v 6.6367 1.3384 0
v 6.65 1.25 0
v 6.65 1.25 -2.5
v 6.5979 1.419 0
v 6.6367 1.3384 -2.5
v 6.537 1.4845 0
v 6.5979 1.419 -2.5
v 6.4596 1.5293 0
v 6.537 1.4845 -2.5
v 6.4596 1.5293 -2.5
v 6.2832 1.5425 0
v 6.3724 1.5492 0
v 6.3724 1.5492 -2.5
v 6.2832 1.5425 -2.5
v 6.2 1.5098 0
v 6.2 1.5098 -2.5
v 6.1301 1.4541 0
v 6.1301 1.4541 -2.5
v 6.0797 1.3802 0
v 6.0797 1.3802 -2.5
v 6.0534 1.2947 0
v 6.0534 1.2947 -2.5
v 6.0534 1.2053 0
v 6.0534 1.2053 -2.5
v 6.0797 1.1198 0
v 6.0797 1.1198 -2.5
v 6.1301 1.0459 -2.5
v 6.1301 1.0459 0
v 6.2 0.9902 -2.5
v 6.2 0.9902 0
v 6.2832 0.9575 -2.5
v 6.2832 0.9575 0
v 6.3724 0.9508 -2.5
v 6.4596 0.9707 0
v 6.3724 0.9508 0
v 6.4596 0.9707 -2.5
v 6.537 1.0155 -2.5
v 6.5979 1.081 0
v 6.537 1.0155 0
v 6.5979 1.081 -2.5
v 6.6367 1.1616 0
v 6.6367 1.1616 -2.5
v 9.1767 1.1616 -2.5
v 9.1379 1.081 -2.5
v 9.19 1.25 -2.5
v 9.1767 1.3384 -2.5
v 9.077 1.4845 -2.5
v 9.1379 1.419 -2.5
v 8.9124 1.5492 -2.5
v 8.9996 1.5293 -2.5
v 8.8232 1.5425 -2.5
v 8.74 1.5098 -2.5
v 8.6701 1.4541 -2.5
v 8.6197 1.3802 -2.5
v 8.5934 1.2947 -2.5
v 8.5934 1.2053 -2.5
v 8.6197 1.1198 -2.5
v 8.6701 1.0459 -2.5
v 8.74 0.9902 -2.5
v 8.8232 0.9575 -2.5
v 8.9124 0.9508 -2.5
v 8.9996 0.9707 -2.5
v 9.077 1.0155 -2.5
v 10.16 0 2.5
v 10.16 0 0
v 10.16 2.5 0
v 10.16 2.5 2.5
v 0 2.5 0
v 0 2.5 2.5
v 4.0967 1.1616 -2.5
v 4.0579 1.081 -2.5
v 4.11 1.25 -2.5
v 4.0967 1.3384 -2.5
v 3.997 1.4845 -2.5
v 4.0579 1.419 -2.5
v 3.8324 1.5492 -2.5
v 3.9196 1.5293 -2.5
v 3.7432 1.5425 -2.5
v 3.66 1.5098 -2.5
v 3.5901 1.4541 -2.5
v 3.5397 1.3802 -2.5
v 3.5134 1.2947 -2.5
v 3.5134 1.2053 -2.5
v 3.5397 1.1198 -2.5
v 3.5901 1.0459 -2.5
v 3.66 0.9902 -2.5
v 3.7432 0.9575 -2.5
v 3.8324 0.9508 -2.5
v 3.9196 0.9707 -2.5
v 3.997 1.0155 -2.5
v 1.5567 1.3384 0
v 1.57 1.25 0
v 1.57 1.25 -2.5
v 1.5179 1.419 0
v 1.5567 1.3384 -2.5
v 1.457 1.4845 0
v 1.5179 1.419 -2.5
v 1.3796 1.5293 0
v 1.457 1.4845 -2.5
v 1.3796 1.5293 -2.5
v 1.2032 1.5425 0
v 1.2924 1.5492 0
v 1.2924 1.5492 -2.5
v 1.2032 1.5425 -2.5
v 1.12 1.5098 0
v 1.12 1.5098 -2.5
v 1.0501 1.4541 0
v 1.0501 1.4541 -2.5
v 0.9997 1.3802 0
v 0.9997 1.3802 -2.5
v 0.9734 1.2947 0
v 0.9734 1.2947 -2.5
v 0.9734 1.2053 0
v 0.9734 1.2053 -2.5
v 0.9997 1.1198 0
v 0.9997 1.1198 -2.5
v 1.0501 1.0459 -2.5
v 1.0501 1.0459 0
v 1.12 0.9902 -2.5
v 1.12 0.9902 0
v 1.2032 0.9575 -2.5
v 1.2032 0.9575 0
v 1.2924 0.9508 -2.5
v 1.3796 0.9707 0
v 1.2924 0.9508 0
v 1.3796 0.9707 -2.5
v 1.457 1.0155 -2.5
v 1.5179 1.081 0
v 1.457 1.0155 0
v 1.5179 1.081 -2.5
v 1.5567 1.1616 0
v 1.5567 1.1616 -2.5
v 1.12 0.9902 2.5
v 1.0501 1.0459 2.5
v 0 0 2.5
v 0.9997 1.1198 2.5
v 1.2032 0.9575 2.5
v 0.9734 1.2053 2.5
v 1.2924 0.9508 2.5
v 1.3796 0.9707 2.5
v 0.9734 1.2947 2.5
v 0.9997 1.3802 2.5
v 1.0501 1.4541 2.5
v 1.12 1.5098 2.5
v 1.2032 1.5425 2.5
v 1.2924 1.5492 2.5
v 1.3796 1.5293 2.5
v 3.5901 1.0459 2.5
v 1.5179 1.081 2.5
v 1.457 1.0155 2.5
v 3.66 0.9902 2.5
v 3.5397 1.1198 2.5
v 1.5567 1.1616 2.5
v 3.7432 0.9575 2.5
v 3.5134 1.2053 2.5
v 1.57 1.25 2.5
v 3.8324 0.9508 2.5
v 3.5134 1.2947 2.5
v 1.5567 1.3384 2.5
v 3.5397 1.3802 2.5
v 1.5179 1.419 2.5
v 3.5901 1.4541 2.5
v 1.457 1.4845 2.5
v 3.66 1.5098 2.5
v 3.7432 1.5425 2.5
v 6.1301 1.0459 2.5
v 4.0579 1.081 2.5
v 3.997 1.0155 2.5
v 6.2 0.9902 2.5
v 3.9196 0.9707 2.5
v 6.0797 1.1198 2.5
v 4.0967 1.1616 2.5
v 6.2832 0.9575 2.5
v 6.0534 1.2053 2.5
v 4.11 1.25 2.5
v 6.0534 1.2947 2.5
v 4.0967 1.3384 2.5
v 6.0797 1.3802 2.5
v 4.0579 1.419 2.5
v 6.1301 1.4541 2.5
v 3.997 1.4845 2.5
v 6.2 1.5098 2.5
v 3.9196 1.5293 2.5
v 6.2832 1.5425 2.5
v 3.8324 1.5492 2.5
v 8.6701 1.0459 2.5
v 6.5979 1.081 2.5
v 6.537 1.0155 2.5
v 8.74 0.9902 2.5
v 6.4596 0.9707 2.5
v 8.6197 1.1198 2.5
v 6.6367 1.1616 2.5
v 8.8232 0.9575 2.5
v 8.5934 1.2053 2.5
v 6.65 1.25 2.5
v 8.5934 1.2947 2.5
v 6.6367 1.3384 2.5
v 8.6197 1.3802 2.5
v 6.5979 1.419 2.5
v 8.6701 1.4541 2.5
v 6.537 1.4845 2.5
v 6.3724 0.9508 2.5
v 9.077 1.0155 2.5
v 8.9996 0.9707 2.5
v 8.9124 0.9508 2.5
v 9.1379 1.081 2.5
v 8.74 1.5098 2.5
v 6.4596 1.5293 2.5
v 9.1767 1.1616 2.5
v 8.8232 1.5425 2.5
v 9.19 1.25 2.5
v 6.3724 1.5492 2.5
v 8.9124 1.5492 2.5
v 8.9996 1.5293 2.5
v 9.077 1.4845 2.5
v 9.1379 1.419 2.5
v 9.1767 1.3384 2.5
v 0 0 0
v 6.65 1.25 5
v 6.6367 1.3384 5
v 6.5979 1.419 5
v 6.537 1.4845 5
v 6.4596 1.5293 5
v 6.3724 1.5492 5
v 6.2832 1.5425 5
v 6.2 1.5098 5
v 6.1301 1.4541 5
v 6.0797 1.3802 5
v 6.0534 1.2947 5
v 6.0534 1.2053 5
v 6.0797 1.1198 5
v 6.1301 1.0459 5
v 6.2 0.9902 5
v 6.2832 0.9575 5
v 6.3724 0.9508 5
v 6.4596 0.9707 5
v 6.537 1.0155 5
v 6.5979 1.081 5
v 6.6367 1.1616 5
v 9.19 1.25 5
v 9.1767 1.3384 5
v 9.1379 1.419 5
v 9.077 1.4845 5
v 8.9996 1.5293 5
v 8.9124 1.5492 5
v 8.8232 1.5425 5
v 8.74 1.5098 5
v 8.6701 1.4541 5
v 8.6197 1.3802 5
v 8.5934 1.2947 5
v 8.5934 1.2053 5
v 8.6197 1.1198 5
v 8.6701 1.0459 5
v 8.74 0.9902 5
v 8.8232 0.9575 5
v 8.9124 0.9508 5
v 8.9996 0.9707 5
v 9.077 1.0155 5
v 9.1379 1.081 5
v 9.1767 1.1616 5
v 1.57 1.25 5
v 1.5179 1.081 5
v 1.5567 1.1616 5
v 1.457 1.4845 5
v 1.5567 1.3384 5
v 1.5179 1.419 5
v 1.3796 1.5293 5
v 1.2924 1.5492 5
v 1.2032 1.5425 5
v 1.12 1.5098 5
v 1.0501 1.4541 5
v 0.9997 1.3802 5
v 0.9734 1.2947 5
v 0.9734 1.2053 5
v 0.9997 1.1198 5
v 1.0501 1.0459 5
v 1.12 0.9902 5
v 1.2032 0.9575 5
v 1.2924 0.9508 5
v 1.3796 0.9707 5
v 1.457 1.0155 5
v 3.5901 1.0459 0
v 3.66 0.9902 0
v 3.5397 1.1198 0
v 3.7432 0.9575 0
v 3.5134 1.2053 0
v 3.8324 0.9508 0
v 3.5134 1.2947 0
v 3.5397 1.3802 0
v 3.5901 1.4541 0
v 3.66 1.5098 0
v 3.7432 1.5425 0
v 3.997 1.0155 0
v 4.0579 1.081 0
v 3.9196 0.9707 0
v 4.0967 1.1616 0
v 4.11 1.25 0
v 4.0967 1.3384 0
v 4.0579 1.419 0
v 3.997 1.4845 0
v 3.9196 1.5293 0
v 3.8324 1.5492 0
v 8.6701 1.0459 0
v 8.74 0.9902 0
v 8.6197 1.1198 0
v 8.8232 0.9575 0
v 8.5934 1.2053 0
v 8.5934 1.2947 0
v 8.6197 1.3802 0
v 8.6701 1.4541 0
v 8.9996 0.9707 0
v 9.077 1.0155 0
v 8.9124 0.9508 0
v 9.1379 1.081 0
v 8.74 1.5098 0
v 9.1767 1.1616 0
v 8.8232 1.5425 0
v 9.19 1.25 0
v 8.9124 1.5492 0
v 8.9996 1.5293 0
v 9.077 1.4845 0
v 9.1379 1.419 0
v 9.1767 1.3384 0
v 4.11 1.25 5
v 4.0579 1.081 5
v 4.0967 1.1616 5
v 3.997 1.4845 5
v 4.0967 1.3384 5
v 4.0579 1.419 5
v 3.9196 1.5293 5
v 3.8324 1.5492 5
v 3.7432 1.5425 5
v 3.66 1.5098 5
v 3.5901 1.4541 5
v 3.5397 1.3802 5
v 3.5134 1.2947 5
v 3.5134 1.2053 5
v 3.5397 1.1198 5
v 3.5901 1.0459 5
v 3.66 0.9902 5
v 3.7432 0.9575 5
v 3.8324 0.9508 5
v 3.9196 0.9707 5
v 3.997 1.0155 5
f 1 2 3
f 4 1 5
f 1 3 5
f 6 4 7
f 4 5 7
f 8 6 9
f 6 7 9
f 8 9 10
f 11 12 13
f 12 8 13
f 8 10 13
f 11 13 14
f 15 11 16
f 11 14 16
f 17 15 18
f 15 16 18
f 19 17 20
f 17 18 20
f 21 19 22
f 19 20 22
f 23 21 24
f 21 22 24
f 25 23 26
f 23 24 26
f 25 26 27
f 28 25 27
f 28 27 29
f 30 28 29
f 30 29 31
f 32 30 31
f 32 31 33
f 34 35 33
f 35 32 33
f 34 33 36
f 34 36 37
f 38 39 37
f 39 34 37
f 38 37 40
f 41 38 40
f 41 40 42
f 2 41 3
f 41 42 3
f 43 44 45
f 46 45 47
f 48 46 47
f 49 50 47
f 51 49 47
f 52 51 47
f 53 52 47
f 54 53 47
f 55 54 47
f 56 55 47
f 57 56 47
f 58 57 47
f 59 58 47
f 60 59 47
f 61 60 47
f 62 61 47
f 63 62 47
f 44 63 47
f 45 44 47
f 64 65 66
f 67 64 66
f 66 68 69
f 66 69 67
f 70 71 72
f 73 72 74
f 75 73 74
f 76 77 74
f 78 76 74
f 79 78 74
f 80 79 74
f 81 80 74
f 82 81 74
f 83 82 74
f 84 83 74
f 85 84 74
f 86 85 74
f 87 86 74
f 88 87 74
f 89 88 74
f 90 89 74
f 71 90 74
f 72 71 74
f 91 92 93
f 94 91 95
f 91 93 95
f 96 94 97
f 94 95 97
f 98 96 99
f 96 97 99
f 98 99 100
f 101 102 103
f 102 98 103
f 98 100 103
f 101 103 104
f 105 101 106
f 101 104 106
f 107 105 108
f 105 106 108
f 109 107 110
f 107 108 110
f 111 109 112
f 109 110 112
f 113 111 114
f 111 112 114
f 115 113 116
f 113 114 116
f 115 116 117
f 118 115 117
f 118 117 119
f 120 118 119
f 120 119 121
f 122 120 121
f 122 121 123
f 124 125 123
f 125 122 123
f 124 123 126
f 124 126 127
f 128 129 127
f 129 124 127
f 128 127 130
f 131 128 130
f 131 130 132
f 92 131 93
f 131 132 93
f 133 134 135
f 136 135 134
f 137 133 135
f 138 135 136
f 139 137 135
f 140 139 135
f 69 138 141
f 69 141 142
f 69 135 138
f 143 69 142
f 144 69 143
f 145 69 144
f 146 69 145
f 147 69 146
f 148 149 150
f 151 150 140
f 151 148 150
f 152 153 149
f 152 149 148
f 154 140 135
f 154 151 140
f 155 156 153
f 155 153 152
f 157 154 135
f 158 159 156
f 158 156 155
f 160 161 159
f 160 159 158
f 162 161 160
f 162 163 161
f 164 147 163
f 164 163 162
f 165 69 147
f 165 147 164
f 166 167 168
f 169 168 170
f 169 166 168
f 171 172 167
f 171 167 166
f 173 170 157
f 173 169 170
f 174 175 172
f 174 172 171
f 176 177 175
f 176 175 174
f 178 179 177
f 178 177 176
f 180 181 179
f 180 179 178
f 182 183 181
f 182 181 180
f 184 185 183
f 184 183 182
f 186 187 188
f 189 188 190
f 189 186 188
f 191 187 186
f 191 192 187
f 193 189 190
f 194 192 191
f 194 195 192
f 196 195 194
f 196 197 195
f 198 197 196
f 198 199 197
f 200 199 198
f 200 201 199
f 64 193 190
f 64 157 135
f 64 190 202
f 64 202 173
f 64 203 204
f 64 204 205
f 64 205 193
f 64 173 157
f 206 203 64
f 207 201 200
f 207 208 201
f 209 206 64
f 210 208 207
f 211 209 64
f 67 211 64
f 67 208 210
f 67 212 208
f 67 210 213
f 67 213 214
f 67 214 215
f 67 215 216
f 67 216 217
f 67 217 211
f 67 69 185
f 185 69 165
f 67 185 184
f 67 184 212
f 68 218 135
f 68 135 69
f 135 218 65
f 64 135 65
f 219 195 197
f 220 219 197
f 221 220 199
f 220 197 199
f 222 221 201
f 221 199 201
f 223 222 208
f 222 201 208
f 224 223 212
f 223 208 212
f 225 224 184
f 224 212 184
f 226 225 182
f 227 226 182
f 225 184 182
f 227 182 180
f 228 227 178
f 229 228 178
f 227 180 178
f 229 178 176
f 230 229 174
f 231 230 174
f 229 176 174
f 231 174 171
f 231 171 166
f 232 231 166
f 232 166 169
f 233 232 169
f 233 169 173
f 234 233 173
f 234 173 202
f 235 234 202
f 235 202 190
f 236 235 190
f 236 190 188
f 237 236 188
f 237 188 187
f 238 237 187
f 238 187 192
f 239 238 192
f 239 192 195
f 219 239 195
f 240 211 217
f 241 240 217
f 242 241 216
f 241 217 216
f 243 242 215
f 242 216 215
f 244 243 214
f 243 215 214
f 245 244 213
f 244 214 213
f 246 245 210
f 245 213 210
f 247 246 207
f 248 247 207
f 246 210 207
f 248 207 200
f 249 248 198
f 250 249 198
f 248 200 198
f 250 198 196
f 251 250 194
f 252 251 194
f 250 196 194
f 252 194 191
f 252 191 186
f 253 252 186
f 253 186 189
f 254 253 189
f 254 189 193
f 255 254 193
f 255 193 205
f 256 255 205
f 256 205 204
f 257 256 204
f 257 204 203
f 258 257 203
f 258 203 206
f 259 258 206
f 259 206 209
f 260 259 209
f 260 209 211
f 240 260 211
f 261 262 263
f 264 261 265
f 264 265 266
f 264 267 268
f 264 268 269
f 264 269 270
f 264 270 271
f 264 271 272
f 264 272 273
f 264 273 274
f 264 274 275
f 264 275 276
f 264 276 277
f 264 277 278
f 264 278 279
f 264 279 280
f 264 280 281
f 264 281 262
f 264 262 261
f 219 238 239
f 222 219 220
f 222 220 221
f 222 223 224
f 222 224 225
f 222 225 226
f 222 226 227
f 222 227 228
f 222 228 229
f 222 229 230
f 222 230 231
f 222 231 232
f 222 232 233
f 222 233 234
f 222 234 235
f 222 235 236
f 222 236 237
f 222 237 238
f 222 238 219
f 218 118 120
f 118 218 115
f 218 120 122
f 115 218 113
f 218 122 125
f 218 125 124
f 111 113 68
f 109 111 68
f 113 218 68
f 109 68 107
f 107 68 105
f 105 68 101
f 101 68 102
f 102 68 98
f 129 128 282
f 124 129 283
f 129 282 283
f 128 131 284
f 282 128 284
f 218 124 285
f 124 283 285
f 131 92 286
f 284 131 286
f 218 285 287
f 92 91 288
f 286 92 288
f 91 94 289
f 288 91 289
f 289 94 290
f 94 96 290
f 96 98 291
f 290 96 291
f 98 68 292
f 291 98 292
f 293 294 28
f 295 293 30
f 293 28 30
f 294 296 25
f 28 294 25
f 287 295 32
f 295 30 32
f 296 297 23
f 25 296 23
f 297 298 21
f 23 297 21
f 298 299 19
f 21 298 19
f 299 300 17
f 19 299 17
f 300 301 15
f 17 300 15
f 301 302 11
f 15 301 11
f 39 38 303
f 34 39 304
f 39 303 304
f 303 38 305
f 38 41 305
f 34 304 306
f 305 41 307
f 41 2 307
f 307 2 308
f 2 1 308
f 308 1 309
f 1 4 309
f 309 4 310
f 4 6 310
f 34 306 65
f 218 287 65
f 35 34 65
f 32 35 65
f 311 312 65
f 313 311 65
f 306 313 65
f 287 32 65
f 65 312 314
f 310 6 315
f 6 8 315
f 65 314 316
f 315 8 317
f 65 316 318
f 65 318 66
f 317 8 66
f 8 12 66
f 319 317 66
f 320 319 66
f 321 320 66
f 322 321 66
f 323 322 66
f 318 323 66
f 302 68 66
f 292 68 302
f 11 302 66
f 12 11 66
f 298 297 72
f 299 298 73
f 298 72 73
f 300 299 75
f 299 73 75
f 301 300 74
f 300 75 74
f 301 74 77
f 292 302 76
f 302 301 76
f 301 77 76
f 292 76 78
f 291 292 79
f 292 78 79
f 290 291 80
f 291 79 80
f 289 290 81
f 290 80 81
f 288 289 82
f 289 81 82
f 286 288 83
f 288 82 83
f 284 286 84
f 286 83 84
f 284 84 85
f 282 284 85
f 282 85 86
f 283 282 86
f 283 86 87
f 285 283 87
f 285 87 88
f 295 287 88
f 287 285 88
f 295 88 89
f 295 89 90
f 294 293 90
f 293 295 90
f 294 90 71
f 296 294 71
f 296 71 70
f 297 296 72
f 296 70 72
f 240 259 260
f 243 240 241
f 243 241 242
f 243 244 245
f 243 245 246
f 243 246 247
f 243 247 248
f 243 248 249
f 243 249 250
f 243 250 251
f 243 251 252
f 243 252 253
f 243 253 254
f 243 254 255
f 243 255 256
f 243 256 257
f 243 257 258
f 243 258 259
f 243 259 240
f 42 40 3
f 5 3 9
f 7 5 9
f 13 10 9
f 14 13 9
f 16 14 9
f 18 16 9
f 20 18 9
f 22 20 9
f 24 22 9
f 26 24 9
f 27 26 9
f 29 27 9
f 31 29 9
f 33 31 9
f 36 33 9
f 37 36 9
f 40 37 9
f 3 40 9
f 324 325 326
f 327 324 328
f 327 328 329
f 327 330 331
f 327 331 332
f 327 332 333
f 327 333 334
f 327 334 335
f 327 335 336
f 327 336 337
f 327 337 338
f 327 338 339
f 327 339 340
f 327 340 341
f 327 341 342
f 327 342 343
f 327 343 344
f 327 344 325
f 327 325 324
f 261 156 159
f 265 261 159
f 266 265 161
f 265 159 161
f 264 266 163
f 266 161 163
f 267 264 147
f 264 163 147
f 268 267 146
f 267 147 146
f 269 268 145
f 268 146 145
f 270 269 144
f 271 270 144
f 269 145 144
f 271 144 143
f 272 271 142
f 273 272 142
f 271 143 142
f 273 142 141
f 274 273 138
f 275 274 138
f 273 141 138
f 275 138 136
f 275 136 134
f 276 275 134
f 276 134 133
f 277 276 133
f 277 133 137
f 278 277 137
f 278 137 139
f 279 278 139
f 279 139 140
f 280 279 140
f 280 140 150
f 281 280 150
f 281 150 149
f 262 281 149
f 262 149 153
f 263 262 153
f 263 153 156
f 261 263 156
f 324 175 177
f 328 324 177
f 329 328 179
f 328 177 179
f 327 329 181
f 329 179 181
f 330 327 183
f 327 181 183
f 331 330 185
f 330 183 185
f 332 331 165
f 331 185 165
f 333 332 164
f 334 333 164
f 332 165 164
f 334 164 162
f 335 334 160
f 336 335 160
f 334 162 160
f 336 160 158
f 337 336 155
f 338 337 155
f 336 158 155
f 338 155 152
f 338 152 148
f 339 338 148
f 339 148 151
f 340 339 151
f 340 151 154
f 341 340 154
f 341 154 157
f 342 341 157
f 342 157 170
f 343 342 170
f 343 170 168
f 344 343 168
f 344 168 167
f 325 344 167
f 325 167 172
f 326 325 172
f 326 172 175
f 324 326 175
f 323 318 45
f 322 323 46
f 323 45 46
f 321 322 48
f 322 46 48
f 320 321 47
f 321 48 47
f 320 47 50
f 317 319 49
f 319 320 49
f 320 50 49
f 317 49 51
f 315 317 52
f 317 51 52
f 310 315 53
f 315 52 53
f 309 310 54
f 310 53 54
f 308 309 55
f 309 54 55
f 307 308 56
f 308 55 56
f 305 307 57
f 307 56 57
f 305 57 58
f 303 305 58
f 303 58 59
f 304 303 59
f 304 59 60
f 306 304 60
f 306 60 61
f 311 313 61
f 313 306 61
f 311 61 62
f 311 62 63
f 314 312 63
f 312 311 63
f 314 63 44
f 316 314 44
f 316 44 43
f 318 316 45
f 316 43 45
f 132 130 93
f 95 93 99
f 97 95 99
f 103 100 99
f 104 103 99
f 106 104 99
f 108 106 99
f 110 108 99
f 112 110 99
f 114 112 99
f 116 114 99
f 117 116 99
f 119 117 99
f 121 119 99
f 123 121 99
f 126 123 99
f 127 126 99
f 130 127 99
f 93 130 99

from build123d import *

# Parameters (mm, degrees)
SKETCH_1_W                 = 10.16
SKETCH_1_H                 = 2.5
EXTRUDE_1_DEPTH            = 2.5
EXTRUDE_START              = -5
SKETCH_2_R                 = 0.3
EXTRUDE_2_DEPTH            = 7.5
PATTERN_LINEAR_1_COUNT     = 3
PATTERN_LINEAR_1_PITCH     = 2.54
PATTERN_LINEAR_1_COL_COUNT = 2
PATTERN_LINEAR_1_COL_PITCH = 2.54


with BuildPart() as part:
    # 草图1 → 凸台-拉伸1 (new body)
    with BuildSketch(Plane.XY):
        with Locations((5.08, 1.25)):
            Rectangle(SKETCH_1_W, SKETCH_1_H)
    extrude(amount=EXTRUDE_1_DEPTH)

    # 草图2 → 凸台-拉伸2 (add)
    with BuildSketch(Plane.XY.offset(2.5).offset(EXTRUDE_START)):
        with Locations((3.81, 1.25)):
            Circle(SKETCH_2_R)
    extrude_2 = extrude(amount=EXTRUDE_2_DEPTH)

    # 阵列(线性)1: 凸台-拉伸2 ×3
    with Locations(*[(i * PATTERN_LINEAR_1_PITCH, 0, 0) for i in range(1, PATTERN_LINEAR_1_COUNT)]):
        add(extrude_2)

    # 阵列(线性)1 col: 凸台-拉伸2 ×2
    with Locations(*[(-i * PATTERN_LINEAR_1_COL_PITCH, 0, 0) for i in range(1, PATTERN_LINEAR_1_COL_COUNT)]):
        add(extrude_2)


solid = part.part
